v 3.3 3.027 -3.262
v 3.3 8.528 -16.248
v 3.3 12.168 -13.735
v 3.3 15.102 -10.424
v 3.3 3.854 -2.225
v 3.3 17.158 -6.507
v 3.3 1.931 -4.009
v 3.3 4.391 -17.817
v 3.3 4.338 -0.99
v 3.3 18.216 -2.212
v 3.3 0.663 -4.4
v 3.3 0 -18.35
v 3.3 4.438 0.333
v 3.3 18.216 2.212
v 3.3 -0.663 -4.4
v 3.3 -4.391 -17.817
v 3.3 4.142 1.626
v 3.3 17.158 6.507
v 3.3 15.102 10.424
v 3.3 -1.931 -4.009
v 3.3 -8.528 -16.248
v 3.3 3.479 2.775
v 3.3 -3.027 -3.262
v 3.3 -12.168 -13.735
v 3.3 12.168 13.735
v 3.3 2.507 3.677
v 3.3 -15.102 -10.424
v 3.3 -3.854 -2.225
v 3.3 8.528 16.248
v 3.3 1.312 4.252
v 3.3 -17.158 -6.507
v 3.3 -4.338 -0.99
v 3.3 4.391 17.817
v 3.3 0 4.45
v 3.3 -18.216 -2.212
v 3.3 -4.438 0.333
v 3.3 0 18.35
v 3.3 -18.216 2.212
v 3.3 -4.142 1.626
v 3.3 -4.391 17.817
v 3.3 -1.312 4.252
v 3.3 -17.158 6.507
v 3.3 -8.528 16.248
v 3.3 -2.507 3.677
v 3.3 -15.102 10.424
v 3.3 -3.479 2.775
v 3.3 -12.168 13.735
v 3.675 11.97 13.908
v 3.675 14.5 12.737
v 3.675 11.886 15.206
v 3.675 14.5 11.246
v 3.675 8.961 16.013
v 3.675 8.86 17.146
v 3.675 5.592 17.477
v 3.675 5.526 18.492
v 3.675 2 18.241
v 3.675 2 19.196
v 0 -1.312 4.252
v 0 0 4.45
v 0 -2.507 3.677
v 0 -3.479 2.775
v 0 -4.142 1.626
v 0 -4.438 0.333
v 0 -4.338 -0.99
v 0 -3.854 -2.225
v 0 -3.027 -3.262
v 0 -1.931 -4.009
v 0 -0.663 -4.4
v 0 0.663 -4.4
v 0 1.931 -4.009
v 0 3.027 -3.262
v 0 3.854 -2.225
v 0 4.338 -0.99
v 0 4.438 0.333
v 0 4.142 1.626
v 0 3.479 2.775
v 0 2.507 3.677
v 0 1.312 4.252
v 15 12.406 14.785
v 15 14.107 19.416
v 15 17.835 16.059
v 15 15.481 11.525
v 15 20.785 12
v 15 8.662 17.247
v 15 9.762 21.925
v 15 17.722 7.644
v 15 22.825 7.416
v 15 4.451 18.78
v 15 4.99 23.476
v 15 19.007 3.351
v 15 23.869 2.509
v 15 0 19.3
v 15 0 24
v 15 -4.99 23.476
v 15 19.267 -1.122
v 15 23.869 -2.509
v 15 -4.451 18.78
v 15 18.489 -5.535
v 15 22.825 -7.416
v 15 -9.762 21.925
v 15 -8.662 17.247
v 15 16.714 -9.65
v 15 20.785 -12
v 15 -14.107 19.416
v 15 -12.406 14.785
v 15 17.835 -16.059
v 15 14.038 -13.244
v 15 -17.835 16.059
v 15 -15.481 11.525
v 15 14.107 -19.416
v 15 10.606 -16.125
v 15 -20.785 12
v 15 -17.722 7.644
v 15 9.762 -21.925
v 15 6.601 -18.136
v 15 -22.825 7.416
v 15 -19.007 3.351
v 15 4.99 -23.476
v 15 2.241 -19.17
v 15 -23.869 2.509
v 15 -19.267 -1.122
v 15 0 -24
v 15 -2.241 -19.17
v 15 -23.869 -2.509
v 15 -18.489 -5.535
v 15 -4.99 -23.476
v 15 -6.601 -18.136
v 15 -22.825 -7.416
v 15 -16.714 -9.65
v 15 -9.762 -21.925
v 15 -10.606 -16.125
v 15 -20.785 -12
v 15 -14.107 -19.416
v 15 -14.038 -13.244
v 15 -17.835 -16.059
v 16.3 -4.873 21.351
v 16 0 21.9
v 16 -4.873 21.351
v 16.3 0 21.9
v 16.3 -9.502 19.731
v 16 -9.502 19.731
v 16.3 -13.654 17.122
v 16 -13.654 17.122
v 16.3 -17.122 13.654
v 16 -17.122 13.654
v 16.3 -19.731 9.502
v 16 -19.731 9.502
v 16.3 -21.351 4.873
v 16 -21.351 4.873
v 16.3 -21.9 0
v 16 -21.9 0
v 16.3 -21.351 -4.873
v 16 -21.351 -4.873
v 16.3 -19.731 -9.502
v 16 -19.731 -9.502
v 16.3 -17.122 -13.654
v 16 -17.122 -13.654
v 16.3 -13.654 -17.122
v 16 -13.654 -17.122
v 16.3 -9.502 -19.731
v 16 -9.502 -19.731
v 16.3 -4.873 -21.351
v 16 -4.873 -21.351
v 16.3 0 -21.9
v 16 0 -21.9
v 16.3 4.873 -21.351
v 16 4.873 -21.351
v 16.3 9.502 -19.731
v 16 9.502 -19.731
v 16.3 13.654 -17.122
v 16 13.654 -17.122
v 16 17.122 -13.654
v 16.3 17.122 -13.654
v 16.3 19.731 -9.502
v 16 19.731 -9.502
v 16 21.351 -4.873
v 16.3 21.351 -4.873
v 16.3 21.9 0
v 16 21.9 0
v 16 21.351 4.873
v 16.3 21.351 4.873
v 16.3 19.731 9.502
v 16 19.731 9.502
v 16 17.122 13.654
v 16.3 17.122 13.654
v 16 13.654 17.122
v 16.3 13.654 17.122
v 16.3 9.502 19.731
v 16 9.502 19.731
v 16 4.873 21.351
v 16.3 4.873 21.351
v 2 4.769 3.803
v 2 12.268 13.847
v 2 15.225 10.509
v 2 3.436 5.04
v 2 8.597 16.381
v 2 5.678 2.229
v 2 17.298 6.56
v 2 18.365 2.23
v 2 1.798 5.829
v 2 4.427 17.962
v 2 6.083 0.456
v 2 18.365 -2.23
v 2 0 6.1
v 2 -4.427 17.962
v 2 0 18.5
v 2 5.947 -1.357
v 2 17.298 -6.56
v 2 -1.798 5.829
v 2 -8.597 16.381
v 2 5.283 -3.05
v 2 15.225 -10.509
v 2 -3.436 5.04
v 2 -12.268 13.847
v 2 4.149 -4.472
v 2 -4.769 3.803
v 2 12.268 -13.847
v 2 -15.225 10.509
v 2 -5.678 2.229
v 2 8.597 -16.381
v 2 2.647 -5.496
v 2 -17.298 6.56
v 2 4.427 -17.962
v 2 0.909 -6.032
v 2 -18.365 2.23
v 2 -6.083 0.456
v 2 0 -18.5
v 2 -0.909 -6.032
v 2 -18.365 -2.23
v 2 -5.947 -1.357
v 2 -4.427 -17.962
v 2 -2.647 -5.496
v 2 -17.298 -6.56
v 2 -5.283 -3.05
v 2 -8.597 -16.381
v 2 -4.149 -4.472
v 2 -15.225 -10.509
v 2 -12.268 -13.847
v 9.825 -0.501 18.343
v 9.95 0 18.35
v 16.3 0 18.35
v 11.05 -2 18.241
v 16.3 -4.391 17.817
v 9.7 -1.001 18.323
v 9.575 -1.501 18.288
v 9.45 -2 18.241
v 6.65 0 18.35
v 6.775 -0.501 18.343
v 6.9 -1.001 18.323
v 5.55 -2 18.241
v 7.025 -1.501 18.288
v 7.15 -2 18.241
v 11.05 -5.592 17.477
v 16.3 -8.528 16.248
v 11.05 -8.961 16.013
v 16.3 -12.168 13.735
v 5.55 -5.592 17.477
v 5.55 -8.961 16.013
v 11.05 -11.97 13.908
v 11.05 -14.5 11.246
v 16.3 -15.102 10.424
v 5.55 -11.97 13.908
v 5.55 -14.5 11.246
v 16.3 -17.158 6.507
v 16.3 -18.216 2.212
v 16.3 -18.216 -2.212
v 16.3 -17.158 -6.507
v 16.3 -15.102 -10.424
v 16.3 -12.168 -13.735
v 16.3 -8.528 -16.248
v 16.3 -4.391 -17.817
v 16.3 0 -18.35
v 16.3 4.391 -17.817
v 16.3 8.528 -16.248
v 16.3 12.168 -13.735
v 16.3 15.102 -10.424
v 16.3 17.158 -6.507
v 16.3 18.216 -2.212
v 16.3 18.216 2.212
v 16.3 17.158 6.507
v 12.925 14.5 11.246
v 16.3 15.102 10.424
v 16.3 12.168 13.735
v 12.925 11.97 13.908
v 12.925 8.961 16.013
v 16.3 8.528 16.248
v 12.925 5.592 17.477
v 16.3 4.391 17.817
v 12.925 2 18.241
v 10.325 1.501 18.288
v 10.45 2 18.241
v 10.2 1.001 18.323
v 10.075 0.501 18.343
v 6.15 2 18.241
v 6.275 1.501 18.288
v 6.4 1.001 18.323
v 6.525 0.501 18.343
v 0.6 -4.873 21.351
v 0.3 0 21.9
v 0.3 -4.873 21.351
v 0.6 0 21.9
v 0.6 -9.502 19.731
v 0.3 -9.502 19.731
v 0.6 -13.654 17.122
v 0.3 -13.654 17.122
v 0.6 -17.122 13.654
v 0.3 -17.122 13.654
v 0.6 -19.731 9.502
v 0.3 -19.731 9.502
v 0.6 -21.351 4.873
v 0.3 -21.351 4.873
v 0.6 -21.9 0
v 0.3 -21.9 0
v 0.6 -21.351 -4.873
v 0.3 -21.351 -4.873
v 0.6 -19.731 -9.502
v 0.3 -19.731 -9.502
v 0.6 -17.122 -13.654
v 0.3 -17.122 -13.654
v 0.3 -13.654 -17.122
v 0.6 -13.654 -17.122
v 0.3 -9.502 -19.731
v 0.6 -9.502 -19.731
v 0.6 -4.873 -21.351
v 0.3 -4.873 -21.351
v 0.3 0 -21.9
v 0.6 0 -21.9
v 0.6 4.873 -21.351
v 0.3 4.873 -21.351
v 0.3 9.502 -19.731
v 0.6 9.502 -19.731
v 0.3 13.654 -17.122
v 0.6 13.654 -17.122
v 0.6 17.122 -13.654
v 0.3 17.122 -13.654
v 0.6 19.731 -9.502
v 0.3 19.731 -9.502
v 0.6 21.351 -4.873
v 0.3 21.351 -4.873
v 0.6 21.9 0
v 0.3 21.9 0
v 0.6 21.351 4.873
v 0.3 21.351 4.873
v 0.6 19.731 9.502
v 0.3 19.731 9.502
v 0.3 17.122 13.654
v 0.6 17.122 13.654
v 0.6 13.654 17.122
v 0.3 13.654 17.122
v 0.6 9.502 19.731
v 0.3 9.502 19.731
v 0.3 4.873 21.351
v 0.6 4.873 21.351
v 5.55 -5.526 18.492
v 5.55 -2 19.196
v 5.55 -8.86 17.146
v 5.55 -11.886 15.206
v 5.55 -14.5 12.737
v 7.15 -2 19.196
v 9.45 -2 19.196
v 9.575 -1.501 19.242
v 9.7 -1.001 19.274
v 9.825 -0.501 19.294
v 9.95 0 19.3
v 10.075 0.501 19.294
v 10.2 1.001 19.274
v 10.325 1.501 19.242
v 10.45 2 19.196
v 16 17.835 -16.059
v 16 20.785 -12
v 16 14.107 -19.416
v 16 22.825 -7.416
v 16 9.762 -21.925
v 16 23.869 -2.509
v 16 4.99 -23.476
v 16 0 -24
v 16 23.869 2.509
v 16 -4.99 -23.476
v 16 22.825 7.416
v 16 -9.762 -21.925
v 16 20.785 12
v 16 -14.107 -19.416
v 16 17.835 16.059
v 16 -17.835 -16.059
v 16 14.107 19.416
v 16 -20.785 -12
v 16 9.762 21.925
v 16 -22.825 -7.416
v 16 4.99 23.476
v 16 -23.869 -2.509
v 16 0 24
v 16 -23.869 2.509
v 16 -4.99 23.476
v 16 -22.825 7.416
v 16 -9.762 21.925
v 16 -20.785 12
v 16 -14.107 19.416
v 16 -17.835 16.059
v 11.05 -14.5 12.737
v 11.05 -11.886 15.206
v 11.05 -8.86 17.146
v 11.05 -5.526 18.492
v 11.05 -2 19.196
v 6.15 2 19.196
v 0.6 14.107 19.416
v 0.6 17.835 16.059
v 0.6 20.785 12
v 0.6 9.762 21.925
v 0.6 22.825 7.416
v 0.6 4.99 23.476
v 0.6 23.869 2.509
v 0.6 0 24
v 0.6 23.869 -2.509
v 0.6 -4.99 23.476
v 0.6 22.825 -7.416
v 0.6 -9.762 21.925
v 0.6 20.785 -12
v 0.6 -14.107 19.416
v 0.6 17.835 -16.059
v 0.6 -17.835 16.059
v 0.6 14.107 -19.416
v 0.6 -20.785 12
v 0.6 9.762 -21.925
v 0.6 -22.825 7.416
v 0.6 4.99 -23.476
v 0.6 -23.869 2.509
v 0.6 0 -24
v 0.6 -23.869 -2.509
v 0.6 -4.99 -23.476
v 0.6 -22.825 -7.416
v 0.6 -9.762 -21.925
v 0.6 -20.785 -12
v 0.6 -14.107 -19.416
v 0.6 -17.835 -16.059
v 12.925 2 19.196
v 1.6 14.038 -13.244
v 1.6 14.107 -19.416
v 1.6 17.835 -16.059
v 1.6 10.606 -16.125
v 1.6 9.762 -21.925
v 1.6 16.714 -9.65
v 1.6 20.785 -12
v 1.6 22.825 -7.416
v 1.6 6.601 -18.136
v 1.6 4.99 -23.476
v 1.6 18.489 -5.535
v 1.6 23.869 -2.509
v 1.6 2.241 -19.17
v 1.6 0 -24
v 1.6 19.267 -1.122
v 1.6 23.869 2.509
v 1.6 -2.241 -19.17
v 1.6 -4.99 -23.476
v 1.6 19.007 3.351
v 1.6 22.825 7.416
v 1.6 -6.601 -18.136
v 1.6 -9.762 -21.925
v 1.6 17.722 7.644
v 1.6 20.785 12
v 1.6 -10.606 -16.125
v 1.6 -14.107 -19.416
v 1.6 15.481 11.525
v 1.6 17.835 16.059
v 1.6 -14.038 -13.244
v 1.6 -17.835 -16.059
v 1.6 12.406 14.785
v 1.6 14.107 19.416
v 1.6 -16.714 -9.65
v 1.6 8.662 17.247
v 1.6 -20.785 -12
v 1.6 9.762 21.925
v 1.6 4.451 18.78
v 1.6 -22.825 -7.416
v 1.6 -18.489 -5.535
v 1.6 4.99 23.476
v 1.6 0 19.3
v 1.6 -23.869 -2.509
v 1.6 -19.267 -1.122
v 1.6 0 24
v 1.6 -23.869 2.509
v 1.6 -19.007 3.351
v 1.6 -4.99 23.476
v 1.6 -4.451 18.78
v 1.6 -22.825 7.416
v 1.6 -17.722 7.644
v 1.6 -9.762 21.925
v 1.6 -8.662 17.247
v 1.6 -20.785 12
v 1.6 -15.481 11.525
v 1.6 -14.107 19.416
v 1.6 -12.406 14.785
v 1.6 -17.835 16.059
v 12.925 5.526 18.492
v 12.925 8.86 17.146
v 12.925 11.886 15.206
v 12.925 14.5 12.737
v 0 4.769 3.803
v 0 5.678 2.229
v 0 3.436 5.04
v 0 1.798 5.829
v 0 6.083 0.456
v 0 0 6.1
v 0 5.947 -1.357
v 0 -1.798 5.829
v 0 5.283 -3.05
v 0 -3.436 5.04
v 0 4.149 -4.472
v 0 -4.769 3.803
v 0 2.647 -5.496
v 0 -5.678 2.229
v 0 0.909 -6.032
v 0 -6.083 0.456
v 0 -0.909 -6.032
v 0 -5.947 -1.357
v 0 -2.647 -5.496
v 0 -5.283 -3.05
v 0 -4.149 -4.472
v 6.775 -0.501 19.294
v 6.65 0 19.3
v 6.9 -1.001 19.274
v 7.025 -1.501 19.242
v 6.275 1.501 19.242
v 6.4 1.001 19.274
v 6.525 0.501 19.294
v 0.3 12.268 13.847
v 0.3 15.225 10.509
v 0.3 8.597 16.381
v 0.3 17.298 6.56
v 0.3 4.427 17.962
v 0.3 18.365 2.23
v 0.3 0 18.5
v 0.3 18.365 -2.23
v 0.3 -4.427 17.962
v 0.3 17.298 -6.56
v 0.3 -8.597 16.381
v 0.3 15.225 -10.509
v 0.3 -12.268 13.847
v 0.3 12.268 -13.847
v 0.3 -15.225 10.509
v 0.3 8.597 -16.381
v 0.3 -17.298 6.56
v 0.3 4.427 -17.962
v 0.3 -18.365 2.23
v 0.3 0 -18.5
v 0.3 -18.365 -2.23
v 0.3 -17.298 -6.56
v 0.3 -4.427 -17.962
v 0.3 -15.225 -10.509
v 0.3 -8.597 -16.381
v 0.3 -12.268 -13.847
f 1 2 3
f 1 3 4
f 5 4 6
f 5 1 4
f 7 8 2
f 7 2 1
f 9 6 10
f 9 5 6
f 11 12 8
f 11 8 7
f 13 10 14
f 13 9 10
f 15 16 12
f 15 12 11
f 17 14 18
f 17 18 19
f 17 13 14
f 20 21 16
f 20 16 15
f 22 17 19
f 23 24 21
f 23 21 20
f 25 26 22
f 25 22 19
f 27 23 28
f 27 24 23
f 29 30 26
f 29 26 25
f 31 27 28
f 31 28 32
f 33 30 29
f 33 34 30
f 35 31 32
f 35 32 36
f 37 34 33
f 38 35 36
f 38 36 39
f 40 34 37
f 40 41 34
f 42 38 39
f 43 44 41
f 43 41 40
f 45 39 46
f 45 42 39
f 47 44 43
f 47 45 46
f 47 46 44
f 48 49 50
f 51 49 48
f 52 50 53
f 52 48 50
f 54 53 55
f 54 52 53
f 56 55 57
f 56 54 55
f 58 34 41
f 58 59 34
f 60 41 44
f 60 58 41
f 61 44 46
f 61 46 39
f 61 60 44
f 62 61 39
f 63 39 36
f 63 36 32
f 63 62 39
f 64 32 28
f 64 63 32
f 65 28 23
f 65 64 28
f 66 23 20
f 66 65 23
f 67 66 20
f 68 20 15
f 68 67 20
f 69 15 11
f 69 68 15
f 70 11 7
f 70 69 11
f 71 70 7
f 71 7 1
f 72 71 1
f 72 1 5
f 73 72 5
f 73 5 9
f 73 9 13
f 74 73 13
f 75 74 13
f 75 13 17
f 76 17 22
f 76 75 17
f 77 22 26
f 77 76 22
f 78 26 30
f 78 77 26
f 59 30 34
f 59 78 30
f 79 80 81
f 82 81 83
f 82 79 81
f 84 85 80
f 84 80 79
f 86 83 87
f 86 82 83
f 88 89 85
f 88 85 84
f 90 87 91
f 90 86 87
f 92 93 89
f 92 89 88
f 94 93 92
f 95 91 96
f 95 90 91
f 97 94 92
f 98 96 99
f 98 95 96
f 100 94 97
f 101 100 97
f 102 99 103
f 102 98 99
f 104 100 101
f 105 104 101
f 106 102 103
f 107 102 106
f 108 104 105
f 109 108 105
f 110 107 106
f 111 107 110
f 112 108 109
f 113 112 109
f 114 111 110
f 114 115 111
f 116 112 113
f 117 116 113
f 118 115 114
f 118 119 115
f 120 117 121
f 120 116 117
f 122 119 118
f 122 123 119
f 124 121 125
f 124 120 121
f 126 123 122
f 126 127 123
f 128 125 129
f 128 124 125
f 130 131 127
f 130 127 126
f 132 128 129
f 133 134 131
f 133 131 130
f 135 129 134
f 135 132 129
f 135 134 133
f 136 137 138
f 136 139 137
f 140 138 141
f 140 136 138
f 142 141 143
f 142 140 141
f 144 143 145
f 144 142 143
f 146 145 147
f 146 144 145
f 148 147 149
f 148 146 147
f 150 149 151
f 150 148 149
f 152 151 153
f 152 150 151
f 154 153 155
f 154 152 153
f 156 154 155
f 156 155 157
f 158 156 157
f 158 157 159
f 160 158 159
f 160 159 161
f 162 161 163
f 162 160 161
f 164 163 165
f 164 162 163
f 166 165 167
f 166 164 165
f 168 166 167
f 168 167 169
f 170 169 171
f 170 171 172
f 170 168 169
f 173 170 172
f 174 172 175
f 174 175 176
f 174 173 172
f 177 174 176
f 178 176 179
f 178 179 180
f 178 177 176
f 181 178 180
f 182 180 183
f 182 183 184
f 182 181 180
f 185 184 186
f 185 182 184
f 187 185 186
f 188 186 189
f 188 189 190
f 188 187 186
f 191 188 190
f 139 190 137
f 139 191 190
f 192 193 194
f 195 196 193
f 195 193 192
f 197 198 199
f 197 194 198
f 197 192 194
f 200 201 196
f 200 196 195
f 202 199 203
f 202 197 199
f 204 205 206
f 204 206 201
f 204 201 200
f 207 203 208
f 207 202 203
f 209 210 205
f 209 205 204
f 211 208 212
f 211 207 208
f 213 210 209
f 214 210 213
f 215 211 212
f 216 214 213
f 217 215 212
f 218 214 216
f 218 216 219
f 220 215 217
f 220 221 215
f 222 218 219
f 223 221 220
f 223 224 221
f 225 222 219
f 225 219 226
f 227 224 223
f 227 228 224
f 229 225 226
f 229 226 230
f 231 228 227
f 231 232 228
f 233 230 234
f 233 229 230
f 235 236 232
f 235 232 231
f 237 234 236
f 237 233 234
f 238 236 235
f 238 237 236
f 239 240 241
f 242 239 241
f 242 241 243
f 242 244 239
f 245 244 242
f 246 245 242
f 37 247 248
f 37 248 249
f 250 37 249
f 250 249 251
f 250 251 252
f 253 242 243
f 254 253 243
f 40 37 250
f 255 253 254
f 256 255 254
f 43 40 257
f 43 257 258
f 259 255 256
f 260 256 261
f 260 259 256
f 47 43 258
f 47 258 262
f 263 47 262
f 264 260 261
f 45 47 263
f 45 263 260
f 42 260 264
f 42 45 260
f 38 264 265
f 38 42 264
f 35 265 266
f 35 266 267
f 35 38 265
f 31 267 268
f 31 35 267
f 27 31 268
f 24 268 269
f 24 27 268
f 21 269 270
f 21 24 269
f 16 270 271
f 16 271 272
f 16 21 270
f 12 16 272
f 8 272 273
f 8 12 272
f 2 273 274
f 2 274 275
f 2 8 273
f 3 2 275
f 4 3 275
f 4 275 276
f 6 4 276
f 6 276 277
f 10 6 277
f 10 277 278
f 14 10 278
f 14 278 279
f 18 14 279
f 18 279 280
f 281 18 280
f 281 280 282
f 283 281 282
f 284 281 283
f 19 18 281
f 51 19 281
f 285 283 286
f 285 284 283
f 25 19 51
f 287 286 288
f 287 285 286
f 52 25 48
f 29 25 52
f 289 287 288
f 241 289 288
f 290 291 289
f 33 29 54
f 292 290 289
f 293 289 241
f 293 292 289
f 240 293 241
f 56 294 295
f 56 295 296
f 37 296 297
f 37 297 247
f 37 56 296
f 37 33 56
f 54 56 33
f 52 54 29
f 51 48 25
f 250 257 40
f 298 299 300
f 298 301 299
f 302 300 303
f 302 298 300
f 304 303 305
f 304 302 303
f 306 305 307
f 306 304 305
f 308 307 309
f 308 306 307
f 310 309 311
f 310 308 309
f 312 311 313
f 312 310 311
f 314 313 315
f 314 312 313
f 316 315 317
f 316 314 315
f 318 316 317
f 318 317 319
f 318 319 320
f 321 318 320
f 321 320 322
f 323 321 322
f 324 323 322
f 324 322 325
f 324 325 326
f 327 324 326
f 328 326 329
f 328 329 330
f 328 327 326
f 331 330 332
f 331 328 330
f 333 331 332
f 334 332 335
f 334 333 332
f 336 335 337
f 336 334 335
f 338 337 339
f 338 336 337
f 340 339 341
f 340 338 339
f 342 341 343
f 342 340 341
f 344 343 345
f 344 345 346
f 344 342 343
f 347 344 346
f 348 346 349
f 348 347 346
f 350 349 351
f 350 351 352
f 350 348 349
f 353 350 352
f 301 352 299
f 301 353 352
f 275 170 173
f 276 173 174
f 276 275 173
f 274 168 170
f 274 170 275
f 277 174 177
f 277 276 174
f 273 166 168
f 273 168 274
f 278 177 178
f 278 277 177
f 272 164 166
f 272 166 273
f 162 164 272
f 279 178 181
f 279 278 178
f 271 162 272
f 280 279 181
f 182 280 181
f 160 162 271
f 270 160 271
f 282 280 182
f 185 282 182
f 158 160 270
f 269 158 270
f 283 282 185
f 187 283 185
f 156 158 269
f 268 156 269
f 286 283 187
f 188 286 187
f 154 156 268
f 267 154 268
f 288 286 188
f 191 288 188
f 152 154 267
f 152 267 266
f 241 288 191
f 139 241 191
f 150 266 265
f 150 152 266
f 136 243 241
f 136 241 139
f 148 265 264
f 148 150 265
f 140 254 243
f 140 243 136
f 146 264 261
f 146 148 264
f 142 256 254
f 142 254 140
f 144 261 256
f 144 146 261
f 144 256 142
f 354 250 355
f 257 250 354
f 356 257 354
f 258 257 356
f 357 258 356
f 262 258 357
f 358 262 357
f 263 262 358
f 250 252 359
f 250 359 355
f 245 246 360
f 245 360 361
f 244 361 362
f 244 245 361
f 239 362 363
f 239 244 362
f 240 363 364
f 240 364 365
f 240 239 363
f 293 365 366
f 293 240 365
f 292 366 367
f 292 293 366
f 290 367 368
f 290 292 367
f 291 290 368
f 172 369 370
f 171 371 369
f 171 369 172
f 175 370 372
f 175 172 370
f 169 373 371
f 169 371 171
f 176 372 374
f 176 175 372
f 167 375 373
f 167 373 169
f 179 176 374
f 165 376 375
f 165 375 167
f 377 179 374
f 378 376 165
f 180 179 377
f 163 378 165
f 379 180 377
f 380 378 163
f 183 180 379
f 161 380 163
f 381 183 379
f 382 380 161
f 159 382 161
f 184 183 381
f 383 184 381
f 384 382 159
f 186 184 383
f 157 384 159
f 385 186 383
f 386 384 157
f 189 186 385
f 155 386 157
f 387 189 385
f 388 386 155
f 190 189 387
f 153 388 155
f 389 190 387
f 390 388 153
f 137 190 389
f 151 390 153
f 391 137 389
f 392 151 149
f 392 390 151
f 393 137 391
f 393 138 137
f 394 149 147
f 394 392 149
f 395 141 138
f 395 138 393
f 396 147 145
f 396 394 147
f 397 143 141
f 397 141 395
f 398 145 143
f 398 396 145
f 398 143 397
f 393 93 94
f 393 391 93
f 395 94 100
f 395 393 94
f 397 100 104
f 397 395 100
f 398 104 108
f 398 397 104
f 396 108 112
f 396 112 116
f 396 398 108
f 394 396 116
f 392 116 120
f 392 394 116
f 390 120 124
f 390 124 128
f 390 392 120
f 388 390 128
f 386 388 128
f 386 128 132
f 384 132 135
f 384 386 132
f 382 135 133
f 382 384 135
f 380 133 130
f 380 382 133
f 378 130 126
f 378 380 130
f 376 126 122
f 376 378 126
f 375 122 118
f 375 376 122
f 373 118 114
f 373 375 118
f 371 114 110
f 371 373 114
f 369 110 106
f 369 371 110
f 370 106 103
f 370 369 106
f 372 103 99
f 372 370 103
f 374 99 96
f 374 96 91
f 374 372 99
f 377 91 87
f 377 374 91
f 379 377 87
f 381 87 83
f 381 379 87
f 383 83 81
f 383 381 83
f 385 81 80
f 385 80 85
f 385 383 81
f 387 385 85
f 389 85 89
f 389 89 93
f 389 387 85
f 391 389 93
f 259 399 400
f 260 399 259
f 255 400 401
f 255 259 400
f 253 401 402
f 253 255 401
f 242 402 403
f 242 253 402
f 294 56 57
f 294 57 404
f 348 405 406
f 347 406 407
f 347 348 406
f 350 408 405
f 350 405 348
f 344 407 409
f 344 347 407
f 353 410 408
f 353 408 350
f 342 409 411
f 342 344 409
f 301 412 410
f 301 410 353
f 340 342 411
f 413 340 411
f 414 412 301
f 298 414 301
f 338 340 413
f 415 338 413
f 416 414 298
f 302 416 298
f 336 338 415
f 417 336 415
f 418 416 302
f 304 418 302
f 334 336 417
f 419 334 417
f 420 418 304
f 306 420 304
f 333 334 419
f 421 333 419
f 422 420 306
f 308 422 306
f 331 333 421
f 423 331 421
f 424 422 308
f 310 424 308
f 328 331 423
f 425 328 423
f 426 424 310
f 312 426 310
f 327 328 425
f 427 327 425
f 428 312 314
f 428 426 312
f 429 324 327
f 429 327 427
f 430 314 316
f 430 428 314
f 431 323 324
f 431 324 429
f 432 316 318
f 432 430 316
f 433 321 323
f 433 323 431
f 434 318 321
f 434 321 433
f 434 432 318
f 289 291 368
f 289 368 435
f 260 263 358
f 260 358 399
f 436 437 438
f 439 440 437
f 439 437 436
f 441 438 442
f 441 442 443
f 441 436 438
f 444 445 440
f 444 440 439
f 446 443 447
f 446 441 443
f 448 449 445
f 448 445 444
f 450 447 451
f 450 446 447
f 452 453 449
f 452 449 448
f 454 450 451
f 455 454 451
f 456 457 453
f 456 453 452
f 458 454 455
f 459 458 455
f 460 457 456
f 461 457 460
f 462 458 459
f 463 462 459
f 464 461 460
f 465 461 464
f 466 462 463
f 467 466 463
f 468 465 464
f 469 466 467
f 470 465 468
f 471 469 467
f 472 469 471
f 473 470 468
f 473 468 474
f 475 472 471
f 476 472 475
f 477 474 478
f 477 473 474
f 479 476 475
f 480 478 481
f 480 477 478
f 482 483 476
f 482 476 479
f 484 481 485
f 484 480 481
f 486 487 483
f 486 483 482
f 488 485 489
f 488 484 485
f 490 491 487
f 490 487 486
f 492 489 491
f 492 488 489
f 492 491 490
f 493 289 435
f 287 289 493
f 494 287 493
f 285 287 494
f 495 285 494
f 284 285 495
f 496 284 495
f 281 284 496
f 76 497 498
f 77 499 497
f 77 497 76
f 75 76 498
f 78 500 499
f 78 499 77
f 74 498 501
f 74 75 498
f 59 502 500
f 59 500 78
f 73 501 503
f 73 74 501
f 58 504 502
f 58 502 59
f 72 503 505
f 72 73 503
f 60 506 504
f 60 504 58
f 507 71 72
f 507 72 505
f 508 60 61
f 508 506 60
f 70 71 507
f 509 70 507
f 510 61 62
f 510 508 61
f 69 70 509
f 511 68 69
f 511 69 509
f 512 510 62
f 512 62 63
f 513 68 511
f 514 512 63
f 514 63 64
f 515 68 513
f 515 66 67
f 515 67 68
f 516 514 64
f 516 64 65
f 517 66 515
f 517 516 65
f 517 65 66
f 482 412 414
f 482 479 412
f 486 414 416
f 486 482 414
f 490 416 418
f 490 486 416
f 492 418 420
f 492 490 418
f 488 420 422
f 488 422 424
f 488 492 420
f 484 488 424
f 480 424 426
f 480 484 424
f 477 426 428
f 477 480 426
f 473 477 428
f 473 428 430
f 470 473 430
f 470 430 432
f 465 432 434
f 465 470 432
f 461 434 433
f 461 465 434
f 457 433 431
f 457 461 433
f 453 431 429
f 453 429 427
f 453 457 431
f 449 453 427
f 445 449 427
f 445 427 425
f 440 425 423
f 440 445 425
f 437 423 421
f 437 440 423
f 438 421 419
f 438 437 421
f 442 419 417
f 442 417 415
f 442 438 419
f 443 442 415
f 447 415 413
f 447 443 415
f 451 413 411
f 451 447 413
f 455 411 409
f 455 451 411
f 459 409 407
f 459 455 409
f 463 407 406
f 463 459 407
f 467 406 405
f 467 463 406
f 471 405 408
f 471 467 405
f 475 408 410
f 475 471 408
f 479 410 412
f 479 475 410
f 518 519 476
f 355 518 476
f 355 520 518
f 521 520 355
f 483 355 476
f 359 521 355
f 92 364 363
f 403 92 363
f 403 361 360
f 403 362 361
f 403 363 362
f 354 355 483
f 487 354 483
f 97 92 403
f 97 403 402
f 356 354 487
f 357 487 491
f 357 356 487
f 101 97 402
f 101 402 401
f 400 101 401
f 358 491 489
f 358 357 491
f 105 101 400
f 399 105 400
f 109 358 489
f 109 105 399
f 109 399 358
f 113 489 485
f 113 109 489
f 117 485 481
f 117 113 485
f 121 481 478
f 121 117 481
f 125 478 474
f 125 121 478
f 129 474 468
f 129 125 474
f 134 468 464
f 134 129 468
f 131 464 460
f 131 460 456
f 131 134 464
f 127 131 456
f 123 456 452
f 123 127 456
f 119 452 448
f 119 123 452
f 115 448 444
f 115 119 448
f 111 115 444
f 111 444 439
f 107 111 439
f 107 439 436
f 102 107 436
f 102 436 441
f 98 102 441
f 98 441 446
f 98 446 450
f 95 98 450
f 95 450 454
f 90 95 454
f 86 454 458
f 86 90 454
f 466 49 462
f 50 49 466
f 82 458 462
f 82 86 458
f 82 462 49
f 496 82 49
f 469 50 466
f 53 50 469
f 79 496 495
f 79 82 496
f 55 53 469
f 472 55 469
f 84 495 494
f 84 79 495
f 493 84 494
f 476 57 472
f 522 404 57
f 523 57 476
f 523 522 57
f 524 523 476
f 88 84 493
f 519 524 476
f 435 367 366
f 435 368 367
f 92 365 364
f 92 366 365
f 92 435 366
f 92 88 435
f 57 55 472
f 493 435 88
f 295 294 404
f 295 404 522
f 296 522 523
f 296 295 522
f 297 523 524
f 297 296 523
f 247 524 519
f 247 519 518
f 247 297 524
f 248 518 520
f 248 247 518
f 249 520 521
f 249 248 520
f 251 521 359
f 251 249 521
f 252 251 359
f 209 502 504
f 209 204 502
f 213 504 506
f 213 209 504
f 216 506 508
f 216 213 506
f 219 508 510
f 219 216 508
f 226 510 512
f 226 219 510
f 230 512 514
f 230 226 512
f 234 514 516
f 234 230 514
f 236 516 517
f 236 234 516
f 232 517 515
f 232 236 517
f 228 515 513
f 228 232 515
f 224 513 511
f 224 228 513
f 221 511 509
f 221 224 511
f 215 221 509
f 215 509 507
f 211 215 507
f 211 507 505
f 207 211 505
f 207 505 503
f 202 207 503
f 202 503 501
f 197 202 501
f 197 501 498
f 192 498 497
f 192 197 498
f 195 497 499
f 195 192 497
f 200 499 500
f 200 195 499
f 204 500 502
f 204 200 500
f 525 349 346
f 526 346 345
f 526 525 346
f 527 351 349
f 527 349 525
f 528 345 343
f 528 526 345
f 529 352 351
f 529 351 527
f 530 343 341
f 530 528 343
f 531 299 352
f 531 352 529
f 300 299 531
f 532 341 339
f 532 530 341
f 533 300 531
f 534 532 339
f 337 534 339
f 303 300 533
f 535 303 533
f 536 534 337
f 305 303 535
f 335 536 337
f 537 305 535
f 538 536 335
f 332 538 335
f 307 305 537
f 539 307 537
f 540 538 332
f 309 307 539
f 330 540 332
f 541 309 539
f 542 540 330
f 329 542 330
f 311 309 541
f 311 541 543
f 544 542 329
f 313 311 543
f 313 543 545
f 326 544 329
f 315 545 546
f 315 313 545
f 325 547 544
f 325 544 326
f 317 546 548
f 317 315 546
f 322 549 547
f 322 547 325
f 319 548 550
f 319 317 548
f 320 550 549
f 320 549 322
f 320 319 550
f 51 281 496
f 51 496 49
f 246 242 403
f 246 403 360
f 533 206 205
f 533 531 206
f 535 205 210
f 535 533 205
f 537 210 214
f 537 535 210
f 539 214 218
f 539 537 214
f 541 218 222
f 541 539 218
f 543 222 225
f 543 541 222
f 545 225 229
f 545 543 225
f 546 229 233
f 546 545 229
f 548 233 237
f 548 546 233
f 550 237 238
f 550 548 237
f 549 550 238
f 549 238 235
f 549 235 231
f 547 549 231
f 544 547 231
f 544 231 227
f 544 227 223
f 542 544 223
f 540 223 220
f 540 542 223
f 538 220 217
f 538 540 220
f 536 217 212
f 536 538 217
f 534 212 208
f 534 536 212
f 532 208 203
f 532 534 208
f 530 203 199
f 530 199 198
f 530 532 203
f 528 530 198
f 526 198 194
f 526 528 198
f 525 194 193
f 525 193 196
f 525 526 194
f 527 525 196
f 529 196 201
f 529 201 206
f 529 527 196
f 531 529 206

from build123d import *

# Parameters (mm, degrees)
KES_EKSTR_ZYON1_DEPTH = 38.65222437


with BuildPart() as part:
    # Çizim1 → Döndür1 (revolve)
    with BuildSketch(Plane.XY, mode=Mode.PRIVATE) as d_nd_r1_sk:
        Polygon((0.3, 18.5), (0.3, 21.9), (0.6, 21.9), (0.6, 24), (1.6, 24), (1.6, 19.3), (15, 19.3), (15, 24), (16, 24), (16, 21.9), (16.3, 21.9), (16.3, 18.35), (3.3, 18.35), (3.3, 4.45), (0, 4.45), (0, 6.1), (2, 6.1), (2, 18.5), align=None)
    revolve(d_nd_r1_sk.sketch.rotate(Axis((-5.366453406, 0, 0), (1, 0, 0)), 90), axis=Axis((-5.366453406, 0, 0), (1, 0, 0)))

    # Çizim2 → Kes-Ekstrüzyon1 (cut, through all)
    with BuildSketch(Plane.XY):
        Polygon((12.925, 14.5), (3.675, 14.5), (3.675, 2), (6.15, 2), (7.15, -2), (5.55, -2), (5.55, -14.5), (11.05, -14.5), (11.05, -2), (9.45, -2), (10.45, 2), (12.925, 2), align=None)
    extrude(amount=KES_EKSTR_ZYON1_DEPTH, mode=Mode.SUBTRACT)


solid = part.part
